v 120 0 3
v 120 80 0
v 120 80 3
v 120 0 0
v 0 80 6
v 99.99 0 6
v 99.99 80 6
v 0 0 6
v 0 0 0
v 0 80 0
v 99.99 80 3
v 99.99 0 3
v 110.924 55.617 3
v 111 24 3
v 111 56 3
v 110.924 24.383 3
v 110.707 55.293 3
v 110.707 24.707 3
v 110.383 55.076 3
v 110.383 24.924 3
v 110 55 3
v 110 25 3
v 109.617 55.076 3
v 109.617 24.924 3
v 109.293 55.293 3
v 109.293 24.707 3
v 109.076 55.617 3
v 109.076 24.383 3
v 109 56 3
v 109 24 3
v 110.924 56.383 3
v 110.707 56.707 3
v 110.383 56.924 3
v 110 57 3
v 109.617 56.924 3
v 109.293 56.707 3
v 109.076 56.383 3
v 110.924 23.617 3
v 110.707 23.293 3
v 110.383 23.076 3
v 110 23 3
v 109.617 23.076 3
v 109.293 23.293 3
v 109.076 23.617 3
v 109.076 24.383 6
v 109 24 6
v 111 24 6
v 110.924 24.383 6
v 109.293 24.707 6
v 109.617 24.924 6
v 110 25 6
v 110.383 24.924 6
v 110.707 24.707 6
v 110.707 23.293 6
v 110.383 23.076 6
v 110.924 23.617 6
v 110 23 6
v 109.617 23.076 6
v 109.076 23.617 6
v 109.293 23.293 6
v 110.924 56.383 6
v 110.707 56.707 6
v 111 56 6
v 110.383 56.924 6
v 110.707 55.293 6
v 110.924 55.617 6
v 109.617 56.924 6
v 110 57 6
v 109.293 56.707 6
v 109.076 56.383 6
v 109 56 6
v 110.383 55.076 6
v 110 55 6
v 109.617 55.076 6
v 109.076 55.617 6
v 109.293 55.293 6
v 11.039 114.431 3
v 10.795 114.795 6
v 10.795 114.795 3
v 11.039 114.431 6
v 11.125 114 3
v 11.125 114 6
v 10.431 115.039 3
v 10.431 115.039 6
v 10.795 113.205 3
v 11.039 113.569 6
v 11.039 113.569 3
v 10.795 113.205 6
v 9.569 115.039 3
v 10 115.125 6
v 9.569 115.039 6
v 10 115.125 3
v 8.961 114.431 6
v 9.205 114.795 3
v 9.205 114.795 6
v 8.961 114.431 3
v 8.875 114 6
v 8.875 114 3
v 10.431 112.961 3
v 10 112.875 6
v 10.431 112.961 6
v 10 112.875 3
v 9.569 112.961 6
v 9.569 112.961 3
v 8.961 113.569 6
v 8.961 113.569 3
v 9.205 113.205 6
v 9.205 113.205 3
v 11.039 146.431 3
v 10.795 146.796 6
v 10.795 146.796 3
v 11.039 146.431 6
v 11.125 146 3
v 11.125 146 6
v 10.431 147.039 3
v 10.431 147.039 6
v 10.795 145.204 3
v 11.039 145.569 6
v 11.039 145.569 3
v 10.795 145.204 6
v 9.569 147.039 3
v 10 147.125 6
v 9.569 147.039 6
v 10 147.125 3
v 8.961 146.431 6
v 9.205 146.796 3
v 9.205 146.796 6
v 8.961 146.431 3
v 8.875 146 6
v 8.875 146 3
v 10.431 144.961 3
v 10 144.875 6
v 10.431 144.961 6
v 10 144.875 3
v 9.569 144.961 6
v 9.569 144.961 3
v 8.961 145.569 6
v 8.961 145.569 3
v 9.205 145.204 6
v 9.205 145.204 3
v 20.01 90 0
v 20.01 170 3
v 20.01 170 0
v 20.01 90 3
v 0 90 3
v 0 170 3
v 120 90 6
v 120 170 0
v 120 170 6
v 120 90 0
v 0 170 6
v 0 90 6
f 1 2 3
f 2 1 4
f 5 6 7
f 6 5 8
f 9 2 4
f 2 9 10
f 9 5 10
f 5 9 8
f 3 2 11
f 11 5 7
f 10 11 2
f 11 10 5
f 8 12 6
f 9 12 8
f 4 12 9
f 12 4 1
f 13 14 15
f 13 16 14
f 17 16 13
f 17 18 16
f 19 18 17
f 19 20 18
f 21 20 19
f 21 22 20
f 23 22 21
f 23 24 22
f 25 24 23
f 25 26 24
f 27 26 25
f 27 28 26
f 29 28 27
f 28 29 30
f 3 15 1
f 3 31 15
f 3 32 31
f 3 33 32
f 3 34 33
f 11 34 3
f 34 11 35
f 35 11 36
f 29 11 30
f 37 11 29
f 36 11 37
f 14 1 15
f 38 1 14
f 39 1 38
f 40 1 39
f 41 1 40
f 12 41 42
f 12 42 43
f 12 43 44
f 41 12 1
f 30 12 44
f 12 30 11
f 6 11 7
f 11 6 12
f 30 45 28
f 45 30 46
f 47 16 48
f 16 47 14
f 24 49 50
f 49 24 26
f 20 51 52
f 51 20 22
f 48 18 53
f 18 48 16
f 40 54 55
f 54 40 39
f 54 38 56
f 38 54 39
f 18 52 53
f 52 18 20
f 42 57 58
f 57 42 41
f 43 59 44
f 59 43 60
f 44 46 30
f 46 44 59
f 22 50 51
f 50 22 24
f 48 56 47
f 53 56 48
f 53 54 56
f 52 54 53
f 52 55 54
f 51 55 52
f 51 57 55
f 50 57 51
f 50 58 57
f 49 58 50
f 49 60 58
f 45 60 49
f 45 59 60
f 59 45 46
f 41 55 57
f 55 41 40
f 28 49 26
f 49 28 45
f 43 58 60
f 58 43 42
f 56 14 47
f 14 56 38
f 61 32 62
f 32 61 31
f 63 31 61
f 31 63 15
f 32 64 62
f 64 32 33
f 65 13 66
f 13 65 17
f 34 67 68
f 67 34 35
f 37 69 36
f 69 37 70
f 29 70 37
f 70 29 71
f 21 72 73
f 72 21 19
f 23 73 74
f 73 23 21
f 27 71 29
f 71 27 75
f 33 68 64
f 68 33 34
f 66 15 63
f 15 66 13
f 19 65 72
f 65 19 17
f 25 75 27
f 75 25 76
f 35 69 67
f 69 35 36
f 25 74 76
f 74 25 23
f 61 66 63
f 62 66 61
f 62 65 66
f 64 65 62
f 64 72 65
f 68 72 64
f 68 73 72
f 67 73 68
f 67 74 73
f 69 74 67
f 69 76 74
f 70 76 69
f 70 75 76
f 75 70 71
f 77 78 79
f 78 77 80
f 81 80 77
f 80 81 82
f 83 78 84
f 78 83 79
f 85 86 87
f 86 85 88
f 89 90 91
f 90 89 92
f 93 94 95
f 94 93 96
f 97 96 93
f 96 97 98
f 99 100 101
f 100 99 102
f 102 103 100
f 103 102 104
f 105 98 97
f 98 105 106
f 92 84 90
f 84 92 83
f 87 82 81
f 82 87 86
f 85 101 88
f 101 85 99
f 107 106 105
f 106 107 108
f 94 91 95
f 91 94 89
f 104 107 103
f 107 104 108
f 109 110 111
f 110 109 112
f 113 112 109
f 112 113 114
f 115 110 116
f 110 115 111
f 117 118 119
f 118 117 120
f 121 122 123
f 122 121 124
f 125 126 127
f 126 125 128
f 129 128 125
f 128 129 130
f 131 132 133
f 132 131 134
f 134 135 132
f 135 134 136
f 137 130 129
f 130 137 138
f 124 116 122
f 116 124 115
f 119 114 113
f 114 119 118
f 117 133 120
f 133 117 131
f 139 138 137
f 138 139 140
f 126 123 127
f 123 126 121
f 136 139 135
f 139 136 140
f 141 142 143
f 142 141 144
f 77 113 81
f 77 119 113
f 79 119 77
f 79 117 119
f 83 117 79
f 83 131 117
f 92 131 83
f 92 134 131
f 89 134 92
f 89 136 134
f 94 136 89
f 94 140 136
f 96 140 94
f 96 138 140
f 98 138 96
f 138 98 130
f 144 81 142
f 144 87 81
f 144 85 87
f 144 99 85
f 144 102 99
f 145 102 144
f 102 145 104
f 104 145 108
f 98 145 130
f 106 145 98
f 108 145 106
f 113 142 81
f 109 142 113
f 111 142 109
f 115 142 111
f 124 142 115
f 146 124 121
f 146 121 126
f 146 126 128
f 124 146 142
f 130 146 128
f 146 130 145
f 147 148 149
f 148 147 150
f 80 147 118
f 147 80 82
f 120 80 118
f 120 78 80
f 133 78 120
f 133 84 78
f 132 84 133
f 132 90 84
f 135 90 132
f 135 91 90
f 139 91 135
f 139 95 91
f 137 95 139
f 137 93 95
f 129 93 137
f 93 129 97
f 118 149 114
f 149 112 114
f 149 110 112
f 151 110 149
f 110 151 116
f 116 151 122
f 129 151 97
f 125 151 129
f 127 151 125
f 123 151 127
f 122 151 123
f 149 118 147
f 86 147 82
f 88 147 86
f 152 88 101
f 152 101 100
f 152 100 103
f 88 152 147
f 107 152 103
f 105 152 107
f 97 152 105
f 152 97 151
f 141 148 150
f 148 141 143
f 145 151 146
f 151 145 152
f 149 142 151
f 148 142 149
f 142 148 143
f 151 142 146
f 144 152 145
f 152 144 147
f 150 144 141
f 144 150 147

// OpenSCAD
// =============================================================
// drawer_board.scad
// Printable drawer wall board segments with integrated lap joints.
//
// A single board is split into two halves; each half prints within
// your printer's bed. They connect via an overlapping lap joint —
// no separate connector piece needed.
//
// Usage
// ─────
//   Print one "a" half and one "b" half per board.
//   Slide them together (A on bottom, B on top at joint).
//   Pins auto-align. Glue for permanent; friction-fit alone is strong.
//
// For corners (90°) use corner_joint from drawer_connectors.scad,
// OR design boards with a matching rabbet end (see corner_board below).
//
// Parameters
//   length     total segment length (mm)          [120]
//   width      board height = drawer wall height   [80]
//   thickness  board thickness                     [6]
//   lap        overlap depth of lap joint          [20]
//   pin_d      alignment pin diameter (0 = none)   [2]
// =============================================================

$fa = 2; $fs = 0.4;
_tol = 0.25;


// =============================================================
// board_half() — one printable segment
//
// joint_end = "a"  → step removed from top half; alignment pins added.
//                    Print this as the BOTTOM piece of the joint.
// joint_end = "b"  → step removed from bottom half; pin holes added.
//                    Print this as the TOP piece of the joint.
// joint_side       = "left" | "right"  which end has the lap feature.
//
// Assembly cross-section at joint (side view, Z = up):
//
//   ┌──────────────────────────────┐  ← Board B (joint_end="b")
//   │  [top half, rest of board]   │
//   │ ┌────────────────────────────┘  ← B's step (bottom removed)
//   │ │
//   └─┘ ┌──────────────────────────┐  ← A's step (top removed)
//       │  [bottom half, rest]     │
//       └──────────────────────────┘  ← Board A (joint_end="a")
//       |←────── lap ─────────────|
//
// Print flat on the build plate (width × length footprint, thickness tall).
// No supports needed.
// =============================================================

module board_half(
    length     = 120,
    width      = 80,
    thickness  = 6,
    joint_end  = "a",
    joint_side = "right",
    lap        = 20,
    pin_d      = 2,
    pin_h      = 3
) {
    ht = thickness / 2;

    // x-coordinate of lap region start
    lx = (joint_side == "right") ? length - lap : 0;

    difference() {
        cube([length, width, thickness]);

        if (joint_end == "a") {
            // Remove top half at lap region
            translate([lx - 0.01, -0.01, ht])
                cube([lap + 0.02, width + 0.02, ht + 0.01]);
        }

        if (joint_end == "b") {
            // Remove bottom half at lap region
            translate([lx - 0.01, -0.01, -0.01])
                cube([lap + 0.02, width + 0.02, ht + 0.01]);

            // Pin holes: drilled from mating surface (z = ht) upward
            if (pin_d > 0)
                for (py = [width * 0.3, width * 0.7])
                    translate([lx + lap / 2, py, ht - 0.01])
                        cylinder(d = pin_d + _tol, h = pin_h + 0.5, $fn = 16);
        }
    }

    // Alignment pins on "a" board: protrude upward from z = ht
    if (joint_end == "a" && pin_d > 0)
        for (py = [width * 0.3, width * 0.7])
            translate([lx + lap / 2, py, ht])
                cylinder(d = pin_d, h = pin_h, $fn = 16);
}


// =============================================================
// DEMO — board A and board B side by side
//
// In the assembled board, slide B (top piece) over A (bottom piece)
// at the lap zone. The pins engage the holes; glue or press-fit.
// =============================================================

_len  = 120;
_w    = 80;
_t    = 6;
_lap  = 20;
_pd   = 2;

// Board A — bottom piece of joint (joint on right end)
color("SteelBlue", 0.9)
board_half(length=_len, width=_w, thickness=_t,
           joint_end="a", joint_side="right",
           lap=_lap, pin_d=_pd);

// Board B — top piece of joint (joint on left end), offset for preview
translate([0, _w + 10, 0])
color("Tomato", 0.9)
board_half(length=_len, width=_w, thickness=_t,
           joint_end="b", joint_side="left",
           lap=_lap, pin_d=_pd);
